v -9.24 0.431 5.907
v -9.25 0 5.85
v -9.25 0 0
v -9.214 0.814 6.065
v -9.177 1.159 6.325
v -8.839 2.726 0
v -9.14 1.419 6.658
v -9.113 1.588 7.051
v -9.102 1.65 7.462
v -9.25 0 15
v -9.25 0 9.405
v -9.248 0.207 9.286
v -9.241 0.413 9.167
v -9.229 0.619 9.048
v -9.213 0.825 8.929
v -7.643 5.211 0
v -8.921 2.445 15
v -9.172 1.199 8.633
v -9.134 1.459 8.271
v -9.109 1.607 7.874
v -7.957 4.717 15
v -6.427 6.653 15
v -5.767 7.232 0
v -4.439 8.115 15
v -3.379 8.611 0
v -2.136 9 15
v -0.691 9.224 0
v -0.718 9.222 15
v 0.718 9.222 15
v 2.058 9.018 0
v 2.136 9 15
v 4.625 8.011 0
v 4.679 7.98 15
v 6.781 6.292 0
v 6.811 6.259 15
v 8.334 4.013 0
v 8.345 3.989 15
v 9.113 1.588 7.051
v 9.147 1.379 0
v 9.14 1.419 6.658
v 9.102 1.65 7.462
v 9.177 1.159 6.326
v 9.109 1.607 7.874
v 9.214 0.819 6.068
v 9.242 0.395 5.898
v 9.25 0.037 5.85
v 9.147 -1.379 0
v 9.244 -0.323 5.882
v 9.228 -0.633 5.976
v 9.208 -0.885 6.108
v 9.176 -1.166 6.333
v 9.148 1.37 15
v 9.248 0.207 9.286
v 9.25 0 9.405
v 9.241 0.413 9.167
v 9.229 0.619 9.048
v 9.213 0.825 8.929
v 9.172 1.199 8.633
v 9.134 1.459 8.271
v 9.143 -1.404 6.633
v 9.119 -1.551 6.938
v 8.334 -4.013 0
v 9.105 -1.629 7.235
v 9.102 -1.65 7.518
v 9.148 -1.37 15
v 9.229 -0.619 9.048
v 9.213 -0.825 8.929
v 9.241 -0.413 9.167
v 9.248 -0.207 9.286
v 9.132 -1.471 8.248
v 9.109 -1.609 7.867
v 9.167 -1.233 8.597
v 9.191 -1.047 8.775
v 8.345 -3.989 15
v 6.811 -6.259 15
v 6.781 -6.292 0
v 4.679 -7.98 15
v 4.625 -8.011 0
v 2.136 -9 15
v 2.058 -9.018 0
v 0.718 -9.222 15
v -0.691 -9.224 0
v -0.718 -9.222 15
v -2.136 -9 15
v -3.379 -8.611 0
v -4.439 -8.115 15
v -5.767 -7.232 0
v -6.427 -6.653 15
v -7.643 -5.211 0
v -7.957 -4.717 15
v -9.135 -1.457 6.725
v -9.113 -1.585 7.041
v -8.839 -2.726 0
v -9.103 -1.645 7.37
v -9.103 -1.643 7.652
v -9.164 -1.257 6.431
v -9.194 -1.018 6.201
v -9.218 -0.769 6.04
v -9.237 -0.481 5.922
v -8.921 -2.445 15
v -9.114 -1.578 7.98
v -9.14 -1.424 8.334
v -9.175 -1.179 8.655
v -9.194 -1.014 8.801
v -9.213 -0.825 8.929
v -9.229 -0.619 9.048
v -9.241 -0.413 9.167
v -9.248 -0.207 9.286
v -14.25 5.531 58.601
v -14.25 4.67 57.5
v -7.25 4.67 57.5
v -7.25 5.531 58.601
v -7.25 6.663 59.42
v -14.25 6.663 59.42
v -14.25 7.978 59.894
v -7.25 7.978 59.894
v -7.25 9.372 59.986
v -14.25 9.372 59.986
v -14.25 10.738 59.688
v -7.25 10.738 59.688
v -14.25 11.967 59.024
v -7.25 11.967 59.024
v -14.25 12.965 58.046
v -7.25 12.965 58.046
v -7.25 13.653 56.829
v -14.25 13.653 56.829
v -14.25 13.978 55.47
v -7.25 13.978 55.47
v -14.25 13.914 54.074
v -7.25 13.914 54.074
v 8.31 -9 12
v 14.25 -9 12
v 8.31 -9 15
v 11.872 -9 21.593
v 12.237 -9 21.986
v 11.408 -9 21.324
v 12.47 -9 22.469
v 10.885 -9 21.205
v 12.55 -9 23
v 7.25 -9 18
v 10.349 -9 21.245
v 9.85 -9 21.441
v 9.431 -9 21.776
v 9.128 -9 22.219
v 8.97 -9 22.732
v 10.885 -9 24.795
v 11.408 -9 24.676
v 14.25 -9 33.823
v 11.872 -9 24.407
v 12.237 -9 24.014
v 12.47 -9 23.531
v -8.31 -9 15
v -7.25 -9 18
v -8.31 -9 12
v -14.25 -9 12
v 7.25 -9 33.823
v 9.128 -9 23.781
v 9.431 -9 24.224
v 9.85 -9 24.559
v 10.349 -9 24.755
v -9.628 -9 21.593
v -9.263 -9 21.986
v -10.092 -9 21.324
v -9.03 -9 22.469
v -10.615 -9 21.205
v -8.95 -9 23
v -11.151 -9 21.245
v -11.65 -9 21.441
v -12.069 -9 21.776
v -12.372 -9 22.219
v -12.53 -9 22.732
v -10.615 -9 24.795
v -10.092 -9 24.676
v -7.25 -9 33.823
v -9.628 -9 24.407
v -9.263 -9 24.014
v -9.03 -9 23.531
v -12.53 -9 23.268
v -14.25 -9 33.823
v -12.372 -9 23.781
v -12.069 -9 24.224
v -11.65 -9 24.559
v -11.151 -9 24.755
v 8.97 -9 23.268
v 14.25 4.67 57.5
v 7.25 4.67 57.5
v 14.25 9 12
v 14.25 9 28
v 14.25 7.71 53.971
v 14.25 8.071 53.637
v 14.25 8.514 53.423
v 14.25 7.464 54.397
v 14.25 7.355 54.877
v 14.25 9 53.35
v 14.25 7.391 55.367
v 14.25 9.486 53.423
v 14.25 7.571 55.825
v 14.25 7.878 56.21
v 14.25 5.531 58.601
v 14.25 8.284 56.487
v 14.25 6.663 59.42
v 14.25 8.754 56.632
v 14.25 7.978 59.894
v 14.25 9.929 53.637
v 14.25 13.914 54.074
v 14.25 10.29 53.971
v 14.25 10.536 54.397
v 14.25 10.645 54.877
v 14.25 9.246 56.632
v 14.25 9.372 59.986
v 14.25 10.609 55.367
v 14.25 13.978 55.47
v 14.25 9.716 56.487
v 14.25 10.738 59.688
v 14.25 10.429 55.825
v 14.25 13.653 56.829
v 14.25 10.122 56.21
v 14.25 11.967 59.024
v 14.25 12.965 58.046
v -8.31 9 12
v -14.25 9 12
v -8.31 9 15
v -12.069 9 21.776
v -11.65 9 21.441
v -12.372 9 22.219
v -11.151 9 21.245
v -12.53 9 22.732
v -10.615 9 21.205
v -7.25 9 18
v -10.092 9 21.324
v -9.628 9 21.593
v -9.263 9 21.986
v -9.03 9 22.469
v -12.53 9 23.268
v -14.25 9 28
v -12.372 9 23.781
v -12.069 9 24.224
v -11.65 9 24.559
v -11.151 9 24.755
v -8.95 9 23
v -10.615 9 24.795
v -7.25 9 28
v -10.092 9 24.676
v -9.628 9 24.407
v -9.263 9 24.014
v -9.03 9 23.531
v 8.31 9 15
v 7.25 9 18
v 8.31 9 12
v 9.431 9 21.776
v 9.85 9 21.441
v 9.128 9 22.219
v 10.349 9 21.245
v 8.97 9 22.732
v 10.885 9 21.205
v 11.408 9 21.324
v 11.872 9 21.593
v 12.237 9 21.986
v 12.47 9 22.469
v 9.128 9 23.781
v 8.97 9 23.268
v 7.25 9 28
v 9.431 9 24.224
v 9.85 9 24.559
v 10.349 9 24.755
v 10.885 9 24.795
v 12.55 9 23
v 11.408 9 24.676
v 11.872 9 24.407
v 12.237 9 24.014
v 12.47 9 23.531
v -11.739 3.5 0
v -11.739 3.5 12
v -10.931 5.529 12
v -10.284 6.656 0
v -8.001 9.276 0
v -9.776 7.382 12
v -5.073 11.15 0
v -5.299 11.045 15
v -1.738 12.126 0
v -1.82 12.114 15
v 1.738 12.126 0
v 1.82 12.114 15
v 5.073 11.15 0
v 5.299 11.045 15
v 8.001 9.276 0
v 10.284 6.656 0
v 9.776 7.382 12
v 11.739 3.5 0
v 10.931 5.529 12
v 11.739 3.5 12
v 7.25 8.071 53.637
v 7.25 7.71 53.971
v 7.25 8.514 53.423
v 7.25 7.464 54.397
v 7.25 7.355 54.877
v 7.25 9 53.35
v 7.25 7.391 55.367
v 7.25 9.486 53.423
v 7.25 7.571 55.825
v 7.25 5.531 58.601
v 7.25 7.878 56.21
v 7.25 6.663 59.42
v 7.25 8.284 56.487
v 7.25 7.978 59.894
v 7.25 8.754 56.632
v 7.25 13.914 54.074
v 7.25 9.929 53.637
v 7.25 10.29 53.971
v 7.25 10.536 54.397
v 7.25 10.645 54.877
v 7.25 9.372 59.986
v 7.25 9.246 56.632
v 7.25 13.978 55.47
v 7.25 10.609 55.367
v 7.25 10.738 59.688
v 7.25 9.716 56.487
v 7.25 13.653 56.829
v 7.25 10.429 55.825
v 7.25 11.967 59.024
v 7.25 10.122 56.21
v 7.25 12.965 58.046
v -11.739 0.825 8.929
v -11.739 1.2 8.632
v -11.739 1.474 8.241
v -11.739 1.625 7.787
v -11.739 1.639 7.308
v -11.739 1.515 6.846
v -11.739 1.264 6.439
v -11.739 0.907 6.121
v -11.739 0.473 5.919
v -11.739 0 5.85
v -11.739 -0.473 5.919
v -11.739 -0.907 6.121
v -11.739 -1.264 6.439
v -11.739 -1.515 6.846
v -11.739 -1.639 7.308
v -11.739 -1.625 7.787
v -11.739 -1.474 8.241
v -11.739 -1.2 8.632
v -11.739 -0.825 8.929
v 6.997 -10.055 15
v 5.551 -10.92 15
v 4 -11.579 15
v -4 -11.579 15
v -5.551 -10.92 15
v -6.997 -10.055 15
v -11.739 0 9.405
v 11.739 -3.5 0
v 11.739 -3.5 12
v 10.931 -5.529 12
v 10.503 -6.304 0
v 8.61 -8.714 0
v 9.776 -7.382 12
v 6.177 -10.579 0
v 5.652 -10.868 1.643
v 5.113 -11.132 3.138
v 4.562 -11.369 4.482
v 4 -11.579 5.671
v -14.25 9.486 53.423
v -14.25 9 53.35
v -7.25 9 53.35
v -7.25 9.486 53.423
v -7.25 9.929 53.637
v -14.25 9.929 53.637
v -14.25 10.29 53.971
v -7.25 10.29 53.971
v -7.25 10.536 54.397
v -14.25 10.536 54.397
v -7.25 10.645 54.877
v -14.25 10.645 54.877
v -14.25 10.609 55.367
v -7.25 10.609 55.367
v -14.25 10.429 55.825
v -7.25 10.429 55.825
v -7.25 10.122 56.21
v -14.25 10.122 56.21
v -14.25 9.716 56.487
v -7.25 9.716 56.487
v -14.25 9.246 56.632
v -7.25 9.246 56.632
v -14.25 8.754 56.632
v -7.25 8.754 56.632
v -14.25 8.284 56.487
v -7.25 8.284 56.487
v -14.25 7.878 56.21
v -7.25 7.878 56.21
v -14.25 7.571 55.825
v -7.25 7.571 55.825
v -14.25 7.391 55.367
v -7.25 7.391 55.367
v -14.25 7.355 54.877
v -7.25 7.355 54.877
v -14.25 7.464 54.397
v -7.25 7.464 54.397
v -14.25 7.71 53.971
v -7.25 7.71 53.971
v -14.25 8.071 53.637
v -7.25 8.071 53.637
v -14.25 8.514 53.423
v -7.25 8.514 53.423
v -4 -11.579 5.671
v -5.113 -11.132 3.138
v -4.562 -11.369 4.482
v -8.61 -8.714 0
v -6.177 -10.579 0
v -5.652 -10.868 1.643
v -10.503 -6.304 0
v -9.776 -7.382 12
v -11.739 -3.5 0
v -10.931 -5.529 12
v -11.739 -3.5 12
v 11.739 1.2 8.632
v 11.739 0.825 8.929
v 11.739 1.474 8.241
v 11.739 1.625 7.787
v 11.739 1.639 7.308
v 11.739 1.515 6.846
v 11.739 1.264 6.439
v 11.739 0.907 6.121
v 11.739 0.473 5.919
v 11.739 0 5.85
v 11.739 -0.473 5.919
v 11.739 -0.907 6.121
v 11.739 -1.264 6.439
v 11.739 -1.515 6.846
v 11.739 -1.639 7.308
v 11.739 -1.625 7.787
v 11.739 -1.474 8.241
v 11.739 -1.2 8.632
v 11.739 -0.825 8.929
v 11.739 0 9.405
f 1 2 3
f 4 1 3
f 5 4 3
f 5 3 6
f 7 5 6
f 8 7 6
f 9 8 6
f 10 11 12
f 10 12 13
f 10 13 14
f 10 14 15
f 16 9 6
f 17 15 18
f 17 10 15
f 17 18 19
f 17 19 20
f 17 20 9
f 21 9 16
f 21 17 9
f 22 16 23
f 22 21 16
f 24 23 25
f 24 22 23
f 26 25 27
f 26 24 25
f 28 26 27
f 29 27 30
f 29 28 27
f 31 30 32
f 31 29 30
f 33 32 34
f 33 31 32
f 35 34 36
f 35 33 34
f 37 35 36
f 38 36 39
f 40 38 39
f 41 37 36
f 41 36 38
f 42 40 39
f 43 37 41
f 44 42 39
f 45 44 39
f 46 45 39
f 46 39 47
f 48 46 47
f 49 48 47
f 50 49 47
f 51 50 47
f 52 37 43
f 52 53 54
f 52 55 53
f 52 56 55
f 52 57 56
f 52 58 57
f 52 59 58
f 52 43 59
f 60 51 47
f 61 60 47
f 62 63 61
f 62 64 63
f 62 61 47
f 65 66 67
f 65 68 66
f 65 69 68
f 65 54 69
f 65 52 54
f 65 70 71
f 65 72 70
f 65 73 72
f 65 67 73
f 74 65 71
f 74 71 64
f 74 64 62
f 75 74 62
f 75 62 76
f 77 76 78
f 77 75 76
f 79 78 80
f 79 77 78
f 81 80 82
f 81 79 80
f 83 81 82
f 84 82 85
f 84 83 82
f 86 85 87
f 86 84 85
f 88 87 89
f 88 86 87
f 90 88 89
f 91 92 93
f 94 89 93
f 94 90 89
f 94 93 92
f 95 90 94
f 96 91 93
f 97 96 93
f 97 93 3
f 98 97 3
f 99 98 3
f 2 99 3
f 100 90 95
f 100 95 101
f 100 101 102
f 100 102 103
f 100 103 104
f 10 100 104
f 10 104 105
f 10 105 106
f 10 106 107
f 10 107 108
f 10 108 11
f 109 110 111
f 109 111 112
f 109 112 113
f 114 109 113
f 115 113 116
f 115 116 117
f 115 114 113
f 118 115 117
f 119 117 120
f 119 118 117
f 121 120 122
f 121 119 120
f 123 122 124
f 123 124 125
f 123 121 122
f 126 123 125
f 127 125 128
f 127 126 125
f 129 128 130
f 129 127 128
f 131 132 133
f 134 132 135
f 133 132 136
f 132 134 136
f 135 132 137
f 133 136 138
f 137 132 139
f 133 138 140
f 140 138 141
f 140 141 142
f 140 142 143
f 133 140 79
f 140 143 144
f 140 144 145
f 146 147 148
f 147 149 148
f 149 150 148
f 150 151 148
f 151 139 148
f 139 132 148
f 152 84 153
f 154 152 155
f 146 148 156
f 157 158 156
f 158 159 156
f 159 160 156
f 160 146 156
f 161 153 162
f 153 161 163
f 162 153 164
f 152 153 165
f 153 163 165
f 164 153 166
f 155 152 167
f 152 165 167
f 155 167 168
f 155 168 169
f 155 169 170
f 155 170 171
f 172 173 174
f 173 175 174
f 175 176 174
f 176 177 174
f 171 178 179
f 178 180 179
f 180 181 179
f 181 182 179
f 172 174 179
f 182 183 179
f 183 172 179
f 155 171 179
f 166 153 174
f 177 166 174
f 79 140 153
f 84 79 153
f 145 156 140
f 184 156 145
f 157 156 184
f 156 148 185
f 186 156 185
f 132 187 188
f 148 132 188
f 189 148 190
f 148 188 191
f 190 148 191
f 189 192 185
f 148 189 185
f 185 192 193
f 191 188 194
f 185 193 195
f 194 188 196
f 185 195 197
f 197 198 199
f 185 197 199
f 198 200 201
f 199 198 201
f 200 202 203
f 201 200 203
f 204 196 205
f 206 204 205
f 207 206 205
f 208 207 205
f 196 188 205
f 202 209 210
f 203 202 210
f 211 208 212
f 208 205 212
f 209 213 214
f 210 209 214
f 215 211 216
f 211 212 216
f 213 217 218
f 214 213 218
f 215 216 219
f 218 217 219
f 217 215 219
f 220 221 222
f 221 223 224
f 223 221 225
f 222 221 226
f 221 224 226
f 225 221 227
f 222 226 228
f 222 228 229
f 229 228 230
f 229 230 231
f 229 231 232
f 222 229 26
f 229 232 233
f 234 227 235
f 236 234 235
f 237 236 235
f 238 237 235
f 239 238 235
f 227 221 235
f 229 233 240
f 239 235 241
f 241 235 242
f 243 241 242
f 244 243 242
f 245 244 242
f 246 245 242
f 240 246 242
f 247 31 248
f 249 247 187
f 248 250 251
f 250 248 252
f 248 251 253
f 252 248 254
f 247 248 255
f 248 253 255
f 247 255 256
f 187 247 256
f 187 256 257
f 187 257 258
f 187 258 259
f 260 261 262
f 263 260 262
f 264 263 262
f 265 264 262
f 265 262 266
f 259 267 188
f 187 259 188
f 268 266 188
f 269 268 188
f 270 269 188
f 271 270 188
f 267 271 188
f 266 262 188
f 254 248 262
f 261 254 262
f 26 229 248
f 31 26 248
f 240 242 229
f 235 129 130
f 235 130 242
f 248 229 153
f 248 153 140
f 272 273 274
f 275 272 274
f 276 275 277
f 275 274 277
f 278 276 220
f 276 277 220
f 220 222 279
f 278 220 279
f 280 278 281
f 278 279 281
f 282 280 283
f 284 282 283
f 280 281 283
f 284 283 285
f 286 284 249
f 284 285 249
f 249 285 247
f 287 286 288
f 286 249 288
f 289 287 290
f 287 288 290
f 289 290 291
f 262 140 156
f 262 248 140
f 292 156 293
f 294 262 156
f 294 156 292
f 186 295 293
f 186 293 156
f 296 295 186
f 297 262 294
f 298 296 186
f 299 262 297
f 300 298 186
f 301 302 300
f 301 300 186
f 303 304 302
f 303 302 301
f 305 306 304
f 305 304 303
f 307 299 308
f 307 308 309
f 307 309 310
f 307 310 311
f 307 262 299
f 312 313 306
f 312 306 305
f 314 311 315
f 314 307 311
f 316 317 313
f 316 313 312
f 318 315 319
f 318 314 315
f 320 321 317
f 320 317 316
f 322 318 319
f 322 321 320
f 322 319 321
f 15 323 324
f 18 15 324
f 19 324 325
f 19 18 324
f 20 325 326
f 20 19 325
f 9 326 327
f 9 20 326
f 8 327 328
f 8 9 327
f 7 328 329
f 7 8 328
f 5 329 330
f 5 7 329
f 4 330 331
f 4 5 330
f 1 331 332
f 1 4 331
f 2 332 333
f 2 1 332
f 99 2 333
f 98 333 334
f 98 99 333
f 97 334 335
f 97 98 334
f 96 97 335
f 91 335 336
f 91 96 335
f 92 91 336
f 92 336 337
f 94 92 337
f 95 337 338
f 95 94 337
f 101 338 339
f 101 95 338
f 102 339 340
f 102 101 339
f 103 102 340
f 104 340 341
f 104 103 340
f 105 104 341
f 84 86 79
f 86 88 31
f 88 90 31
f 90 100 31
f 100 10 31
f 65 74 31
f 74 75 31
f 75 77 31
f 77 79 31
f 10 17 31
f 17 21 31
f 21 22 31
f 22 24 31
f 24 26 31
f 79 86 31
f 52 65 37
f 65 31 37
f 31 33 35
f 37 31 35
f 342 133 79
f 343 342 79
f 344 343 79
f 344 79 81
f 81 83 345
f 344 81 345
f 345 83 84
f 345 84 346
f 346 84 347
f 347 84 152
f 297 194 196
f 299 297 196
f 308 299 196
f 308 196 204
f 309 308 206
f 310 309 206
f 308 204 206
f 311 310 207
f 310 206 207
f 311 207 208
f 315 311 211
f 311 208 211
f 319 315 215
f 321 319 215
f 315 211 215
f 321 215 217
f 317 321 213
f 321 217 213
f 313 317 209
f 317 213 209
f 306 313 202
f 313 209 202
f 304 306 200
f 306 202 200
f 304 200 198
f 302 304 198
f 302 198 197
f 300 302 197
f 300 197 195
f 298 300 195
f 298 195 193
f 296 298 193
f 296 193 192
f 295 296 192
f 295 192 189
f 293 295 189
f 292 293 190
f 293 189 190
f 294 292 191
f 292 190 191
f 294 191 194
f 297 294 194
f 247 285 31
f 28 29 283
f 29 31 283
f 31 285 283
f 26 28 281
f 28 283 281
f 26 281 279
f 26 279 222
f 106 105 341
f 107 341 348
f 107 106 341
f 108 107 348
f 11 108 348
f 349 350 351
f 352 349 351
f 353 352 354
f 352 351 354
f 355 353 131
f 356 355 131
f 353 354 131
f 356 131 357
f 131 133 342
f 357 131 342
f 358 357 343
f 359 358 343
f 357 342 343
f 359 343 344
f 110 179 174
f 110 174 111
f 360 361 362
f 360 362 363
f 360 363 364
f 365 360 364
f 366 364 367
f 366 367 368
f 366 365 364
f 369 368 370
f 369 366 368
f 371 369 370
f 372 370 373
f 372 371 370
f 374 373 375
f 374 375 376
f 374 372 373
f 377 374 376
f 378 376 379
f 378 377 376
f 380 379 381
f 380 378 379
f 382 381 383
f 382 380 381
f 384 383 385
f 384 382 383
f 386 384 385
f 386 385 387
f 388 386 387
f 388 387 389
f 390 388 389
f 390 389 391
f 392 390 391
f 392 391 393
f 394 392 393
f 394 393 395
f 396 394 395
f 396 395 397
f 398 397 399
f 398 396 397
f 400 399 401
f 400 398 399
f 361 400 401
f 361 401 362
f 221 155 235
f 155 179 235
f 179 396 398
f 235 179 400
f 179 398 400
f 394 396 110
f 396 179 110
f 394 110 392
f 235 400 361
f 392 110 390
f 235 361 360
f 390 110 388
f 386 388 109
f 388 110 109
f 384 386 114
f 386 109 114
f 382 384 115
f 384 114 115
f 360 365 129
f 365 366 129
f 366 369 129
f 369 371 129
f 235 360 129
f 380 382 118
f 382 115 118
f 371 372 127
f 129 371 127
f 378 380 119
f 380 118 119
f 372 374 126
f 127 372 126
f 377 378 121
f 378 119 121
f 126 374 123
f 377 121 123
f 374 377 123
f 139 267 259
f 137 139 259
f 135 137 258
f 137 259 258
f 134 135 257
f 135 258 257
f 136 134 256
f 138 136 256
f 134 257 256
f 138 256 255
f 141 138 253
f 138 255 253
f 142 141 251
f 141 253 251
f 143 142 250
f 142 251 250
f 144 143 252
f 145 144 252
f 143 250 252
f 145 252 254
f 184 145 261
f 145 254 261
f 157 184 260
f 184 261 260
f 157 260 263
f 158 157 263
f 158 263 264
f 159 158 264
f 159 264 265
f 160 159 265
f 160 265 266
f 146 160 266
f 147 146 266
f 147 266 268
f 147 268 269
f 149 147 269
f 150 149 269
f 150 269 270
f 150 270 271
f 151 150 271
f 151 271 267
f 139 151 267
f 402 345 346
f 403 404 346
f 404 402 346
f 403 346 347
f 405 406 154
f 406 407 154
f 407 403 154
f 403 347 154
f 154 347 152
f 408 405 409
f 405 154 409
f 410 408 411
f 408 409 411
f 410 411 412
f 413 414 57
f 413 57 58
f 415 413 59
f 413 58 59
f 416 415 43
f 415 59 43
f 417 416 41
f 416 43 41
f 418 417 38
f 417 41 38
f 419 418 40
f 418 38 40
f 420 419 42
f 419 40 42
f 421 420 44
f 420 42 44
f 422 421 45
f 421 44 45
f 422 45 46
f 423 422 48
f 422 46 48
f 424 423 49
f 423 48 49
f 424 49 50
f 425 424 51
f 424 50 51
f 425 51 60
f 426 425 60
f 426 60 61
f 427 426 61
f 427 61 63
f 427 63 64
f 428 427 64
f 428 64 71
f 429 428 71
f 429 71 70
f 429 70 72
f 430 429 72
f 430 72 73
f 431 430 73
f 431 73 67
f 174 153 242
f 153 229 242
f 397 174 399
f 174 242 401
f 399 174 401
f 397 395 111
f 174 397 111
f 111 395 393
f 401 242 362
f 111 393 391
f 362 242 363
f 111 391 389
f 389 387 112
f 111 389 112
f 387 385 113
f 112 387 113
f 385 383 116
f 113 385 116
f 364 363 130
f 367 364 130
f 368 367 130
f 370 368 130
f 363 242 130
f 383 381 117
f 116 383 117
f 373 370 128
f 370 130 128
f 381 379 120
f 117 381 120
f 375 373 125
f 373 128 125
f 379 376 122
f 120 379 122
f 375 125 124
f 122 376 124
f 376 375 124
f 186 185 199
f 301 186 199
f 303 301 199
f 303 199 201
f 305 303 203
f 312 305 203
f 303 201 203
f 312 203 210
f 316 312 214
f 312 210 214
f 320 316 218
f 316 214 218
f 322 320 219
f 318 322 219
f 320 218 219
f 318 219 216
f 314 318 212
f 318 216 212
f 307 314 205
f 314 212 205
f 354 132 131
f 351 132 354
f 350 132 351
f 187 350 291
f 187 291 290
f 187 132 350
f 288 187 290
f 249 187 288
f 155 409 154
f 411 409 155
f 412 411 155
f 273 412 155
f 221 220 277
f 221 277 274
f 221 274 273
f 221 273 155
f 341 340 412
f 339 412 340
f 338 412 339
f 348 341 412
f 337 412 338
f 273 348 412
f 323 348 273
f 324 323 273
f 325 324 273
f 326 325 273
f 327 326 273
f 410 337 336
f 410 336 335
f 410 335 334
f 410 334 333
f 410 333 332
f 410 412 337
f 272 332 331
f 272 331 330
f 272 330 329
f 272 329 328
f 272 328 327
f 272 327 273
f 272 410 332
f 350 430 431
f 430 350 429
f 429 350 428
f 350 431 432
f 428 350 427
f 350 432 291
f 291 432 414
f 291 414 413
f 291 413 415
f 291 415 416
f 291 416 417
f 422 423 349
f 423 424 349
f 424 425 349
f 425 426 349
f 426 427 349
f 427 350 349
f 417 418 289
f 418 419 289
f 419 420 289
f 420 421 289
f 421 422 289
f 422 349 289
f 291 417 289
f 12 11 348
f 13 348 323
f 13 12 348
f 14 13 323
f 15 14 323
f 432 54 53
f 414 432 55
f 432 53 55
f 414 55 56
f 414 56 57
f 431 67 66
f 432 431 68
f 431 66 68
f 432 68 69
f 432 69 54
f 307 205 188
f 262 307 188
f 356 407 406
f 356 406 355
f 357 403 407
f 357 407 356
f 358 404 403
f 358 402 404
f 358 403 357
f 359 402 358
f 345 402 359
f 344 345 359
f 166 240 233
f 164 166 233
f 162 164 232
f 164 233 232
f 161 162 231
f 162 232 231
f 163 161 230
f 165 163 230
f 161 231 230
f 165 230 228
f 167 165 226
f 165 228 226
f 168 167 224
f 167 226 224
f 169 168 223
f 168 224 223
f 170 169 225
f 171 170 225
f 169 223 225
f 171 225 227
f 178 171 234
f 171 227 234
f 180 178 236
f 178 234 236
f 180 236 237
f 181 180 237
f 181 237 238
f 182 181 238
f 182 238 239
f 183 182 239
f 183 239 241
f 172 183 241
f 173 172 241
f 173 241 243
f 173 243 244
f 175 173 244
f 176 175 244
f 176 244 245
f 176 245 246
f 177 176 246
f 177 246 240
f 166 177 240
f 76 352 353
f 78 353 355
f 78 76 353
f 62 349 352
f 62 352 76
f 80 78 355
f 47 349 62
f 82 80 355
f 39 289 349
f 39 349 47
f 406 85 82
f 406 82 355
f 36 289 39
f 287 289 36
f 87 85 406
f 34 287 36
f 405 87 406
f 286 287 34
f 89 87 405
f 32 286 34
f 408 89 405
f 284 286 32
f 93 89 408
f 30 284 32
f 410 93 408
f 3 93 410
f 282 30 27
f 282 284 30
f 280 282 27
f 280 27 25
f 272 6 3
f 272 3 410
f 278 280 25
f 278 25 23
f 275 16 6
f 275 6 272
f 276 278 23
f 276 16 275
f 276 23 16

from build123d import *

# Parameters (mm, degrees)
SKETCH_1_R               = 6.325
EXTRUDE_1_DEPTH          = 15
SKETCH_2_W               = 28.5
SKETCH_2_H               = 18
EXTRUDE_2_DEPTH          = 3
EXTRUDE_START            = 14.25
SKETCH_4_R               = 1.65
EXTRUDE_3_DEPTH          = 7
EXTRUDE_START_2          = -14.25
SKETCH_4_2_R             = 1.65
EXTRUDE_4_DEPTH          = 7
EXTRUDE_5_DEPTH          = 7
SKETCH_7_R               = 1.8
CUT_EXTRUDE_1_DEPTH      = 19
CUT_EXTRUDE_3_DEPTH      = 1
CUT_EXTRUDE_3_DEPTH_BACK = 29.5
SKETCH_10_R              = 12.25
SKETCH_10_R_2            = 9.25
EXTRUDE_6_DEPTH          = 15
EXTRUDE_7_DEPTH          = 3
CUT_EXTRUDE_4_DEPTH      = 15.25
CUT_EXTRUDE_4_DEPTH_BACK = 15.25
SKETCH_13_W              = 7.383863518
SKETCH_13_H              = 7
CUT_EXTRUDE_5_DEPTH      = 12
CUT_EXTRUDE_6_DEPTH      = 1.0000001
CUT_EXTRUDE_6_DEPTH_BACK = 61
CHAMFER_3_SIZE           = 1
CHAMFER_3_SIZE2          = 5.67128182


with BuildPart() as part:
    # ｽｹｯﾁ1 → ﾎﾞｽ - 押し出し1 (new body)
    with BuildSketch(Plane.XY):
        Circle(SKETCH_1_R)
    extrude(amount=EXTRUDE_1_DEPTH)

    # ｽｹｯﾁ2 → ﾎﾞｽ - 押し出し2 (add)
    with BuildSketch(Plane.XY.offset(15)):
        Rectangle(SKETCH_2_W, SKETCH_2_H)
    extrude(amount=EXTRUDE_2_DEPTH)

    # ｽｹｯﾁ4 → ﾎﾞｽ - 押し出し3 (add)
    with BuildSketch(Plane(origin=(0, 0, 0), x_dir=(0, 0, -1), z_dir=(1, 0, 0)).offset(EXTRUDE_START)):
        with BuildLine():
            Line((-54.074074074, 13.913518208), (-28, 9))
            Line((-28, 9), (-18, 9))
            Line((-18, 9), (-18, -9))
            Line((-18, -9), (-56.624751337, 4.271344473))
            ThreePointArc((-56.624751337, 4.271344473), (-59.833732287, 10.278683768), (-54.074074074, 13.913518208))
        make_face()
        with Locations((-55, 9)):
            Circle(SKETCH_4_R, mode=Mode.SUBTRACT)
    extrude(amount=-EXTRUDE_3_DEPTH)

    # ｽｹｯﾁ4<2> → ﾎﾞｽ - 押し出し4 (add)
    with BuildSketch(Plane(origin=(0, 0, 0), x_dir=(0, 0, -1), z_dir=(1, 0, 0)).offset(EXTRUDE_START_2)):
        with BuildLine():
            Line((-54.074074074, 13.913518208), (-28, 9))
            Line((-28, 9), (-18, 9))
            Line((-18, 9), (-18, -9))
            Line((-18, -9), (-56.624751337, 4.271344473))
            ThreePointArc((-56.624751337, 4.271344473), (-59.833732287, 10.278683768), (-54.074074074, 13.913518208))
        make_face()
        with Locations((-55, 9)):
            Circle(SKETCH_4_2_R, mode=Mode.SUBTRACT)
    extrude(amount=EXTRUDE_4_DEPTH)

    # ｽｹｯﾁ5 → ﾎﾞｽ - 押し出し5 (add)
    with BuildSketch(Plane.ZY.offset(14.25)):
        with BuildLine():
            Line((18, -9), (33.823085464, -9))
            Line((33.823085464, -9), (57.5, 4.669872981))
            ThreePointArc((57.5, 4.669872981), (57.071979643, 4.44951647), (56.624751337, 4.271344473))
            Line((56.624751337, 4.271344473), (18, -9))
        make_face()
    extrude_5 = extrude(amount=-EXTRUDE_5_DEPTH)

    # ﾐﾗｰ1: ﾎﾞｽ - 押し出し5 across plane
    add(extrude_5.mirror(Plane(origin=(0, 0, 0), x_dir=(0, 0, 1), z_dir=(1, 0, 0))))

    # ｽｹｯﾁ7 → ｶｯﾄ - 押し出し1 (cut, through all)
    with BuildSketch(Plane(origin=(0, 9, 0), x_dir=(1, 0, 0), z_dir=(0, 1, 0))):
        with Locations((10.75, -23)):
            Circle(SKETCH_7_R)
        with Locations((-10.75, -23)):
            Circle(SKETCH_7_R)
    extrude(amount=-CUT_EXTRUDE_1_DEPTH, mode=Mode.SUBTRACT)

    # ｽｹｯﾁ9 → ｶｯﾄ - 押し出し3 (cut, two sides)
    with BuildSketch(Plane(origin=(14.25, 0, 0), x_dir=(0, 0, -1), z_dir=(1, 0, 0))) as cut_extrude_3_sk:
        Polygon((-15, 127.875853754), (-15, 12.993387334), (-15, -12.927364159), (-15, -127.809830579), (214.76493284, -127.809830579), (214.76493284, 127.875853754), align=None)
    extrude(amount=CUT_EXTRUDE_3_DEPTH, mode=Mode.SUBTRACT)
    extrude(cut_extrude_3_sk.sketch, amount=-CUT_EXTRUDE_3_DEPTH_BACK, mode=Mode.SUBTRACT)

    # ｽｹｯﾁ10 → ﾎﾞｽ - 押し出し6 (add)
    with BuildSketch(Plane(origin=(0, 0, 15), x_dir=(-1, 0, 0), z_dir=(0, 0, -1))):
        Circle(SKETCH_10_R)
        Circle(SKETCH_10_R_2, mode=Mode.SUBTRACT)
    extrude(amount=EXTRUDE_6_DEPTH)

    # ｽｹｯﾁ11 → ﾎﾞｽ - 押し出し7 (add)
    with BuildSketch(Plane(origin=(0, 0, 15), x_dir=(-1, 0, 0), z_dir=(0, 0, -1))):
        with BuildLine():
            Line((8.310385069, -9), (14.25, -9))
            Line((14.25, -9), (14.25, 9))
            Line((14.25, 9), (8.310385069, 9))
            ThreePointArc((8.310385069, 9), (12.25, 0), (8.310385069, -9))
        make_face()
        with BuildLine():
            Line((-8.310385069, 9), (-14.25, 9))
            Line((-14.25, 9), (-14.25, -9))
            Line((-14.25, -9), (-8.310385069, -9))
            ThreePointArc((-8.310385069, -9), (-12.25, 0), (-8.310385069, 9))
        make_face()
    extrude(amount=EXTRUDE_7_DEPTH)

    # ｽｹｯﾁ12 → ｶｯﾄ - 押し出し4 (cut, two sides)
    with BuildSketch(Plane(origin=(0, 0, 0), x_dir=(0, 0, -1), z_dir=(1, 0, 0))) as cut_extrude_4_sk:
        with BuildLine():
            Line((-9.405255888, 0), (-8.928941916, 0.825))
            ThreePointArc((-8.928941916, 0.825), (-5.85, 0), (-8.928941916, -0.825))
            Line((-8.928941916, -0.825), (-9.405255888, 0))
        make_face()
    extrude(amount=CUT_EXTRUDE_4_DEPTH, mode=Mode.SUBTRACT)
    extrude(cut_extrude_4_sk.sketch, amount=-CUT_EXTRUDE_4_DEPTH_BACK, mode=Mode.SUBTRACT)

    # ｽｹｯﾁ13 → ｶｯﾄ - 押し出し5 (cut)
    with BuildSketch(Plane(origin=(0, 0, 0), x_dir=(-1, 0, 0), z_dir=(0, 0, -1))):
        with Locations((15.431288641, 0)):
            Rectangle(SKETCH_13_W, SKETCH_13_H)
        with Locations((-15.431288641, 0)):
            Rectangle(SKETCH_13_W, SKETCH_13_H)
    extrude(amount=-CUT_EXTRUDE_5_DEPTH, mode=Mode.SUBTRACT)

    # ｽｹｯﾁ14 → ｶｯﾄ - 押し出し6 (cut, two sides)
    with BuildSketch(Plane(origin=(0, 0, 0), x_dir=(-1, 0, 0), z_dir=(0, 0, -1))) as cut_extrude_6_sk:
        Polygon((76.843424889, -11.578536177), (4, -11.578536177), (-4, -11.578536177), (-76.843424889, -11.578536177), (-76.843424889, -157.265385955), (76.843424889, -157.265385955), align=None)
    extrude(amount=CUT_EXTRUDE_6_DEPTH, mode=Mode.SUBTRACT)
    extrude(cut_extrude_6_sk.sketch, amount=-CUT_EXTRUDE_6_DEPTH_BACK, mode=Mode.SUBTRACT)

    # 面取り3
    chamfer_3_edges = [part.edges().sort_by_distance(p)[0] for p in [
        (0, -11.578536177, 0),
    ]]
    chamfer_3_side = [part.faces().sort_by_distance(p)[0] for p in [
        (-11.404834964, 0, 0),
    ]]
    chamfer(chamfer_3_edges, length=CHAMFER_3_SIZE, length2=CHAMFER_3_SIZE2, reference=chamfer_3_side[0])


solid = part.part
